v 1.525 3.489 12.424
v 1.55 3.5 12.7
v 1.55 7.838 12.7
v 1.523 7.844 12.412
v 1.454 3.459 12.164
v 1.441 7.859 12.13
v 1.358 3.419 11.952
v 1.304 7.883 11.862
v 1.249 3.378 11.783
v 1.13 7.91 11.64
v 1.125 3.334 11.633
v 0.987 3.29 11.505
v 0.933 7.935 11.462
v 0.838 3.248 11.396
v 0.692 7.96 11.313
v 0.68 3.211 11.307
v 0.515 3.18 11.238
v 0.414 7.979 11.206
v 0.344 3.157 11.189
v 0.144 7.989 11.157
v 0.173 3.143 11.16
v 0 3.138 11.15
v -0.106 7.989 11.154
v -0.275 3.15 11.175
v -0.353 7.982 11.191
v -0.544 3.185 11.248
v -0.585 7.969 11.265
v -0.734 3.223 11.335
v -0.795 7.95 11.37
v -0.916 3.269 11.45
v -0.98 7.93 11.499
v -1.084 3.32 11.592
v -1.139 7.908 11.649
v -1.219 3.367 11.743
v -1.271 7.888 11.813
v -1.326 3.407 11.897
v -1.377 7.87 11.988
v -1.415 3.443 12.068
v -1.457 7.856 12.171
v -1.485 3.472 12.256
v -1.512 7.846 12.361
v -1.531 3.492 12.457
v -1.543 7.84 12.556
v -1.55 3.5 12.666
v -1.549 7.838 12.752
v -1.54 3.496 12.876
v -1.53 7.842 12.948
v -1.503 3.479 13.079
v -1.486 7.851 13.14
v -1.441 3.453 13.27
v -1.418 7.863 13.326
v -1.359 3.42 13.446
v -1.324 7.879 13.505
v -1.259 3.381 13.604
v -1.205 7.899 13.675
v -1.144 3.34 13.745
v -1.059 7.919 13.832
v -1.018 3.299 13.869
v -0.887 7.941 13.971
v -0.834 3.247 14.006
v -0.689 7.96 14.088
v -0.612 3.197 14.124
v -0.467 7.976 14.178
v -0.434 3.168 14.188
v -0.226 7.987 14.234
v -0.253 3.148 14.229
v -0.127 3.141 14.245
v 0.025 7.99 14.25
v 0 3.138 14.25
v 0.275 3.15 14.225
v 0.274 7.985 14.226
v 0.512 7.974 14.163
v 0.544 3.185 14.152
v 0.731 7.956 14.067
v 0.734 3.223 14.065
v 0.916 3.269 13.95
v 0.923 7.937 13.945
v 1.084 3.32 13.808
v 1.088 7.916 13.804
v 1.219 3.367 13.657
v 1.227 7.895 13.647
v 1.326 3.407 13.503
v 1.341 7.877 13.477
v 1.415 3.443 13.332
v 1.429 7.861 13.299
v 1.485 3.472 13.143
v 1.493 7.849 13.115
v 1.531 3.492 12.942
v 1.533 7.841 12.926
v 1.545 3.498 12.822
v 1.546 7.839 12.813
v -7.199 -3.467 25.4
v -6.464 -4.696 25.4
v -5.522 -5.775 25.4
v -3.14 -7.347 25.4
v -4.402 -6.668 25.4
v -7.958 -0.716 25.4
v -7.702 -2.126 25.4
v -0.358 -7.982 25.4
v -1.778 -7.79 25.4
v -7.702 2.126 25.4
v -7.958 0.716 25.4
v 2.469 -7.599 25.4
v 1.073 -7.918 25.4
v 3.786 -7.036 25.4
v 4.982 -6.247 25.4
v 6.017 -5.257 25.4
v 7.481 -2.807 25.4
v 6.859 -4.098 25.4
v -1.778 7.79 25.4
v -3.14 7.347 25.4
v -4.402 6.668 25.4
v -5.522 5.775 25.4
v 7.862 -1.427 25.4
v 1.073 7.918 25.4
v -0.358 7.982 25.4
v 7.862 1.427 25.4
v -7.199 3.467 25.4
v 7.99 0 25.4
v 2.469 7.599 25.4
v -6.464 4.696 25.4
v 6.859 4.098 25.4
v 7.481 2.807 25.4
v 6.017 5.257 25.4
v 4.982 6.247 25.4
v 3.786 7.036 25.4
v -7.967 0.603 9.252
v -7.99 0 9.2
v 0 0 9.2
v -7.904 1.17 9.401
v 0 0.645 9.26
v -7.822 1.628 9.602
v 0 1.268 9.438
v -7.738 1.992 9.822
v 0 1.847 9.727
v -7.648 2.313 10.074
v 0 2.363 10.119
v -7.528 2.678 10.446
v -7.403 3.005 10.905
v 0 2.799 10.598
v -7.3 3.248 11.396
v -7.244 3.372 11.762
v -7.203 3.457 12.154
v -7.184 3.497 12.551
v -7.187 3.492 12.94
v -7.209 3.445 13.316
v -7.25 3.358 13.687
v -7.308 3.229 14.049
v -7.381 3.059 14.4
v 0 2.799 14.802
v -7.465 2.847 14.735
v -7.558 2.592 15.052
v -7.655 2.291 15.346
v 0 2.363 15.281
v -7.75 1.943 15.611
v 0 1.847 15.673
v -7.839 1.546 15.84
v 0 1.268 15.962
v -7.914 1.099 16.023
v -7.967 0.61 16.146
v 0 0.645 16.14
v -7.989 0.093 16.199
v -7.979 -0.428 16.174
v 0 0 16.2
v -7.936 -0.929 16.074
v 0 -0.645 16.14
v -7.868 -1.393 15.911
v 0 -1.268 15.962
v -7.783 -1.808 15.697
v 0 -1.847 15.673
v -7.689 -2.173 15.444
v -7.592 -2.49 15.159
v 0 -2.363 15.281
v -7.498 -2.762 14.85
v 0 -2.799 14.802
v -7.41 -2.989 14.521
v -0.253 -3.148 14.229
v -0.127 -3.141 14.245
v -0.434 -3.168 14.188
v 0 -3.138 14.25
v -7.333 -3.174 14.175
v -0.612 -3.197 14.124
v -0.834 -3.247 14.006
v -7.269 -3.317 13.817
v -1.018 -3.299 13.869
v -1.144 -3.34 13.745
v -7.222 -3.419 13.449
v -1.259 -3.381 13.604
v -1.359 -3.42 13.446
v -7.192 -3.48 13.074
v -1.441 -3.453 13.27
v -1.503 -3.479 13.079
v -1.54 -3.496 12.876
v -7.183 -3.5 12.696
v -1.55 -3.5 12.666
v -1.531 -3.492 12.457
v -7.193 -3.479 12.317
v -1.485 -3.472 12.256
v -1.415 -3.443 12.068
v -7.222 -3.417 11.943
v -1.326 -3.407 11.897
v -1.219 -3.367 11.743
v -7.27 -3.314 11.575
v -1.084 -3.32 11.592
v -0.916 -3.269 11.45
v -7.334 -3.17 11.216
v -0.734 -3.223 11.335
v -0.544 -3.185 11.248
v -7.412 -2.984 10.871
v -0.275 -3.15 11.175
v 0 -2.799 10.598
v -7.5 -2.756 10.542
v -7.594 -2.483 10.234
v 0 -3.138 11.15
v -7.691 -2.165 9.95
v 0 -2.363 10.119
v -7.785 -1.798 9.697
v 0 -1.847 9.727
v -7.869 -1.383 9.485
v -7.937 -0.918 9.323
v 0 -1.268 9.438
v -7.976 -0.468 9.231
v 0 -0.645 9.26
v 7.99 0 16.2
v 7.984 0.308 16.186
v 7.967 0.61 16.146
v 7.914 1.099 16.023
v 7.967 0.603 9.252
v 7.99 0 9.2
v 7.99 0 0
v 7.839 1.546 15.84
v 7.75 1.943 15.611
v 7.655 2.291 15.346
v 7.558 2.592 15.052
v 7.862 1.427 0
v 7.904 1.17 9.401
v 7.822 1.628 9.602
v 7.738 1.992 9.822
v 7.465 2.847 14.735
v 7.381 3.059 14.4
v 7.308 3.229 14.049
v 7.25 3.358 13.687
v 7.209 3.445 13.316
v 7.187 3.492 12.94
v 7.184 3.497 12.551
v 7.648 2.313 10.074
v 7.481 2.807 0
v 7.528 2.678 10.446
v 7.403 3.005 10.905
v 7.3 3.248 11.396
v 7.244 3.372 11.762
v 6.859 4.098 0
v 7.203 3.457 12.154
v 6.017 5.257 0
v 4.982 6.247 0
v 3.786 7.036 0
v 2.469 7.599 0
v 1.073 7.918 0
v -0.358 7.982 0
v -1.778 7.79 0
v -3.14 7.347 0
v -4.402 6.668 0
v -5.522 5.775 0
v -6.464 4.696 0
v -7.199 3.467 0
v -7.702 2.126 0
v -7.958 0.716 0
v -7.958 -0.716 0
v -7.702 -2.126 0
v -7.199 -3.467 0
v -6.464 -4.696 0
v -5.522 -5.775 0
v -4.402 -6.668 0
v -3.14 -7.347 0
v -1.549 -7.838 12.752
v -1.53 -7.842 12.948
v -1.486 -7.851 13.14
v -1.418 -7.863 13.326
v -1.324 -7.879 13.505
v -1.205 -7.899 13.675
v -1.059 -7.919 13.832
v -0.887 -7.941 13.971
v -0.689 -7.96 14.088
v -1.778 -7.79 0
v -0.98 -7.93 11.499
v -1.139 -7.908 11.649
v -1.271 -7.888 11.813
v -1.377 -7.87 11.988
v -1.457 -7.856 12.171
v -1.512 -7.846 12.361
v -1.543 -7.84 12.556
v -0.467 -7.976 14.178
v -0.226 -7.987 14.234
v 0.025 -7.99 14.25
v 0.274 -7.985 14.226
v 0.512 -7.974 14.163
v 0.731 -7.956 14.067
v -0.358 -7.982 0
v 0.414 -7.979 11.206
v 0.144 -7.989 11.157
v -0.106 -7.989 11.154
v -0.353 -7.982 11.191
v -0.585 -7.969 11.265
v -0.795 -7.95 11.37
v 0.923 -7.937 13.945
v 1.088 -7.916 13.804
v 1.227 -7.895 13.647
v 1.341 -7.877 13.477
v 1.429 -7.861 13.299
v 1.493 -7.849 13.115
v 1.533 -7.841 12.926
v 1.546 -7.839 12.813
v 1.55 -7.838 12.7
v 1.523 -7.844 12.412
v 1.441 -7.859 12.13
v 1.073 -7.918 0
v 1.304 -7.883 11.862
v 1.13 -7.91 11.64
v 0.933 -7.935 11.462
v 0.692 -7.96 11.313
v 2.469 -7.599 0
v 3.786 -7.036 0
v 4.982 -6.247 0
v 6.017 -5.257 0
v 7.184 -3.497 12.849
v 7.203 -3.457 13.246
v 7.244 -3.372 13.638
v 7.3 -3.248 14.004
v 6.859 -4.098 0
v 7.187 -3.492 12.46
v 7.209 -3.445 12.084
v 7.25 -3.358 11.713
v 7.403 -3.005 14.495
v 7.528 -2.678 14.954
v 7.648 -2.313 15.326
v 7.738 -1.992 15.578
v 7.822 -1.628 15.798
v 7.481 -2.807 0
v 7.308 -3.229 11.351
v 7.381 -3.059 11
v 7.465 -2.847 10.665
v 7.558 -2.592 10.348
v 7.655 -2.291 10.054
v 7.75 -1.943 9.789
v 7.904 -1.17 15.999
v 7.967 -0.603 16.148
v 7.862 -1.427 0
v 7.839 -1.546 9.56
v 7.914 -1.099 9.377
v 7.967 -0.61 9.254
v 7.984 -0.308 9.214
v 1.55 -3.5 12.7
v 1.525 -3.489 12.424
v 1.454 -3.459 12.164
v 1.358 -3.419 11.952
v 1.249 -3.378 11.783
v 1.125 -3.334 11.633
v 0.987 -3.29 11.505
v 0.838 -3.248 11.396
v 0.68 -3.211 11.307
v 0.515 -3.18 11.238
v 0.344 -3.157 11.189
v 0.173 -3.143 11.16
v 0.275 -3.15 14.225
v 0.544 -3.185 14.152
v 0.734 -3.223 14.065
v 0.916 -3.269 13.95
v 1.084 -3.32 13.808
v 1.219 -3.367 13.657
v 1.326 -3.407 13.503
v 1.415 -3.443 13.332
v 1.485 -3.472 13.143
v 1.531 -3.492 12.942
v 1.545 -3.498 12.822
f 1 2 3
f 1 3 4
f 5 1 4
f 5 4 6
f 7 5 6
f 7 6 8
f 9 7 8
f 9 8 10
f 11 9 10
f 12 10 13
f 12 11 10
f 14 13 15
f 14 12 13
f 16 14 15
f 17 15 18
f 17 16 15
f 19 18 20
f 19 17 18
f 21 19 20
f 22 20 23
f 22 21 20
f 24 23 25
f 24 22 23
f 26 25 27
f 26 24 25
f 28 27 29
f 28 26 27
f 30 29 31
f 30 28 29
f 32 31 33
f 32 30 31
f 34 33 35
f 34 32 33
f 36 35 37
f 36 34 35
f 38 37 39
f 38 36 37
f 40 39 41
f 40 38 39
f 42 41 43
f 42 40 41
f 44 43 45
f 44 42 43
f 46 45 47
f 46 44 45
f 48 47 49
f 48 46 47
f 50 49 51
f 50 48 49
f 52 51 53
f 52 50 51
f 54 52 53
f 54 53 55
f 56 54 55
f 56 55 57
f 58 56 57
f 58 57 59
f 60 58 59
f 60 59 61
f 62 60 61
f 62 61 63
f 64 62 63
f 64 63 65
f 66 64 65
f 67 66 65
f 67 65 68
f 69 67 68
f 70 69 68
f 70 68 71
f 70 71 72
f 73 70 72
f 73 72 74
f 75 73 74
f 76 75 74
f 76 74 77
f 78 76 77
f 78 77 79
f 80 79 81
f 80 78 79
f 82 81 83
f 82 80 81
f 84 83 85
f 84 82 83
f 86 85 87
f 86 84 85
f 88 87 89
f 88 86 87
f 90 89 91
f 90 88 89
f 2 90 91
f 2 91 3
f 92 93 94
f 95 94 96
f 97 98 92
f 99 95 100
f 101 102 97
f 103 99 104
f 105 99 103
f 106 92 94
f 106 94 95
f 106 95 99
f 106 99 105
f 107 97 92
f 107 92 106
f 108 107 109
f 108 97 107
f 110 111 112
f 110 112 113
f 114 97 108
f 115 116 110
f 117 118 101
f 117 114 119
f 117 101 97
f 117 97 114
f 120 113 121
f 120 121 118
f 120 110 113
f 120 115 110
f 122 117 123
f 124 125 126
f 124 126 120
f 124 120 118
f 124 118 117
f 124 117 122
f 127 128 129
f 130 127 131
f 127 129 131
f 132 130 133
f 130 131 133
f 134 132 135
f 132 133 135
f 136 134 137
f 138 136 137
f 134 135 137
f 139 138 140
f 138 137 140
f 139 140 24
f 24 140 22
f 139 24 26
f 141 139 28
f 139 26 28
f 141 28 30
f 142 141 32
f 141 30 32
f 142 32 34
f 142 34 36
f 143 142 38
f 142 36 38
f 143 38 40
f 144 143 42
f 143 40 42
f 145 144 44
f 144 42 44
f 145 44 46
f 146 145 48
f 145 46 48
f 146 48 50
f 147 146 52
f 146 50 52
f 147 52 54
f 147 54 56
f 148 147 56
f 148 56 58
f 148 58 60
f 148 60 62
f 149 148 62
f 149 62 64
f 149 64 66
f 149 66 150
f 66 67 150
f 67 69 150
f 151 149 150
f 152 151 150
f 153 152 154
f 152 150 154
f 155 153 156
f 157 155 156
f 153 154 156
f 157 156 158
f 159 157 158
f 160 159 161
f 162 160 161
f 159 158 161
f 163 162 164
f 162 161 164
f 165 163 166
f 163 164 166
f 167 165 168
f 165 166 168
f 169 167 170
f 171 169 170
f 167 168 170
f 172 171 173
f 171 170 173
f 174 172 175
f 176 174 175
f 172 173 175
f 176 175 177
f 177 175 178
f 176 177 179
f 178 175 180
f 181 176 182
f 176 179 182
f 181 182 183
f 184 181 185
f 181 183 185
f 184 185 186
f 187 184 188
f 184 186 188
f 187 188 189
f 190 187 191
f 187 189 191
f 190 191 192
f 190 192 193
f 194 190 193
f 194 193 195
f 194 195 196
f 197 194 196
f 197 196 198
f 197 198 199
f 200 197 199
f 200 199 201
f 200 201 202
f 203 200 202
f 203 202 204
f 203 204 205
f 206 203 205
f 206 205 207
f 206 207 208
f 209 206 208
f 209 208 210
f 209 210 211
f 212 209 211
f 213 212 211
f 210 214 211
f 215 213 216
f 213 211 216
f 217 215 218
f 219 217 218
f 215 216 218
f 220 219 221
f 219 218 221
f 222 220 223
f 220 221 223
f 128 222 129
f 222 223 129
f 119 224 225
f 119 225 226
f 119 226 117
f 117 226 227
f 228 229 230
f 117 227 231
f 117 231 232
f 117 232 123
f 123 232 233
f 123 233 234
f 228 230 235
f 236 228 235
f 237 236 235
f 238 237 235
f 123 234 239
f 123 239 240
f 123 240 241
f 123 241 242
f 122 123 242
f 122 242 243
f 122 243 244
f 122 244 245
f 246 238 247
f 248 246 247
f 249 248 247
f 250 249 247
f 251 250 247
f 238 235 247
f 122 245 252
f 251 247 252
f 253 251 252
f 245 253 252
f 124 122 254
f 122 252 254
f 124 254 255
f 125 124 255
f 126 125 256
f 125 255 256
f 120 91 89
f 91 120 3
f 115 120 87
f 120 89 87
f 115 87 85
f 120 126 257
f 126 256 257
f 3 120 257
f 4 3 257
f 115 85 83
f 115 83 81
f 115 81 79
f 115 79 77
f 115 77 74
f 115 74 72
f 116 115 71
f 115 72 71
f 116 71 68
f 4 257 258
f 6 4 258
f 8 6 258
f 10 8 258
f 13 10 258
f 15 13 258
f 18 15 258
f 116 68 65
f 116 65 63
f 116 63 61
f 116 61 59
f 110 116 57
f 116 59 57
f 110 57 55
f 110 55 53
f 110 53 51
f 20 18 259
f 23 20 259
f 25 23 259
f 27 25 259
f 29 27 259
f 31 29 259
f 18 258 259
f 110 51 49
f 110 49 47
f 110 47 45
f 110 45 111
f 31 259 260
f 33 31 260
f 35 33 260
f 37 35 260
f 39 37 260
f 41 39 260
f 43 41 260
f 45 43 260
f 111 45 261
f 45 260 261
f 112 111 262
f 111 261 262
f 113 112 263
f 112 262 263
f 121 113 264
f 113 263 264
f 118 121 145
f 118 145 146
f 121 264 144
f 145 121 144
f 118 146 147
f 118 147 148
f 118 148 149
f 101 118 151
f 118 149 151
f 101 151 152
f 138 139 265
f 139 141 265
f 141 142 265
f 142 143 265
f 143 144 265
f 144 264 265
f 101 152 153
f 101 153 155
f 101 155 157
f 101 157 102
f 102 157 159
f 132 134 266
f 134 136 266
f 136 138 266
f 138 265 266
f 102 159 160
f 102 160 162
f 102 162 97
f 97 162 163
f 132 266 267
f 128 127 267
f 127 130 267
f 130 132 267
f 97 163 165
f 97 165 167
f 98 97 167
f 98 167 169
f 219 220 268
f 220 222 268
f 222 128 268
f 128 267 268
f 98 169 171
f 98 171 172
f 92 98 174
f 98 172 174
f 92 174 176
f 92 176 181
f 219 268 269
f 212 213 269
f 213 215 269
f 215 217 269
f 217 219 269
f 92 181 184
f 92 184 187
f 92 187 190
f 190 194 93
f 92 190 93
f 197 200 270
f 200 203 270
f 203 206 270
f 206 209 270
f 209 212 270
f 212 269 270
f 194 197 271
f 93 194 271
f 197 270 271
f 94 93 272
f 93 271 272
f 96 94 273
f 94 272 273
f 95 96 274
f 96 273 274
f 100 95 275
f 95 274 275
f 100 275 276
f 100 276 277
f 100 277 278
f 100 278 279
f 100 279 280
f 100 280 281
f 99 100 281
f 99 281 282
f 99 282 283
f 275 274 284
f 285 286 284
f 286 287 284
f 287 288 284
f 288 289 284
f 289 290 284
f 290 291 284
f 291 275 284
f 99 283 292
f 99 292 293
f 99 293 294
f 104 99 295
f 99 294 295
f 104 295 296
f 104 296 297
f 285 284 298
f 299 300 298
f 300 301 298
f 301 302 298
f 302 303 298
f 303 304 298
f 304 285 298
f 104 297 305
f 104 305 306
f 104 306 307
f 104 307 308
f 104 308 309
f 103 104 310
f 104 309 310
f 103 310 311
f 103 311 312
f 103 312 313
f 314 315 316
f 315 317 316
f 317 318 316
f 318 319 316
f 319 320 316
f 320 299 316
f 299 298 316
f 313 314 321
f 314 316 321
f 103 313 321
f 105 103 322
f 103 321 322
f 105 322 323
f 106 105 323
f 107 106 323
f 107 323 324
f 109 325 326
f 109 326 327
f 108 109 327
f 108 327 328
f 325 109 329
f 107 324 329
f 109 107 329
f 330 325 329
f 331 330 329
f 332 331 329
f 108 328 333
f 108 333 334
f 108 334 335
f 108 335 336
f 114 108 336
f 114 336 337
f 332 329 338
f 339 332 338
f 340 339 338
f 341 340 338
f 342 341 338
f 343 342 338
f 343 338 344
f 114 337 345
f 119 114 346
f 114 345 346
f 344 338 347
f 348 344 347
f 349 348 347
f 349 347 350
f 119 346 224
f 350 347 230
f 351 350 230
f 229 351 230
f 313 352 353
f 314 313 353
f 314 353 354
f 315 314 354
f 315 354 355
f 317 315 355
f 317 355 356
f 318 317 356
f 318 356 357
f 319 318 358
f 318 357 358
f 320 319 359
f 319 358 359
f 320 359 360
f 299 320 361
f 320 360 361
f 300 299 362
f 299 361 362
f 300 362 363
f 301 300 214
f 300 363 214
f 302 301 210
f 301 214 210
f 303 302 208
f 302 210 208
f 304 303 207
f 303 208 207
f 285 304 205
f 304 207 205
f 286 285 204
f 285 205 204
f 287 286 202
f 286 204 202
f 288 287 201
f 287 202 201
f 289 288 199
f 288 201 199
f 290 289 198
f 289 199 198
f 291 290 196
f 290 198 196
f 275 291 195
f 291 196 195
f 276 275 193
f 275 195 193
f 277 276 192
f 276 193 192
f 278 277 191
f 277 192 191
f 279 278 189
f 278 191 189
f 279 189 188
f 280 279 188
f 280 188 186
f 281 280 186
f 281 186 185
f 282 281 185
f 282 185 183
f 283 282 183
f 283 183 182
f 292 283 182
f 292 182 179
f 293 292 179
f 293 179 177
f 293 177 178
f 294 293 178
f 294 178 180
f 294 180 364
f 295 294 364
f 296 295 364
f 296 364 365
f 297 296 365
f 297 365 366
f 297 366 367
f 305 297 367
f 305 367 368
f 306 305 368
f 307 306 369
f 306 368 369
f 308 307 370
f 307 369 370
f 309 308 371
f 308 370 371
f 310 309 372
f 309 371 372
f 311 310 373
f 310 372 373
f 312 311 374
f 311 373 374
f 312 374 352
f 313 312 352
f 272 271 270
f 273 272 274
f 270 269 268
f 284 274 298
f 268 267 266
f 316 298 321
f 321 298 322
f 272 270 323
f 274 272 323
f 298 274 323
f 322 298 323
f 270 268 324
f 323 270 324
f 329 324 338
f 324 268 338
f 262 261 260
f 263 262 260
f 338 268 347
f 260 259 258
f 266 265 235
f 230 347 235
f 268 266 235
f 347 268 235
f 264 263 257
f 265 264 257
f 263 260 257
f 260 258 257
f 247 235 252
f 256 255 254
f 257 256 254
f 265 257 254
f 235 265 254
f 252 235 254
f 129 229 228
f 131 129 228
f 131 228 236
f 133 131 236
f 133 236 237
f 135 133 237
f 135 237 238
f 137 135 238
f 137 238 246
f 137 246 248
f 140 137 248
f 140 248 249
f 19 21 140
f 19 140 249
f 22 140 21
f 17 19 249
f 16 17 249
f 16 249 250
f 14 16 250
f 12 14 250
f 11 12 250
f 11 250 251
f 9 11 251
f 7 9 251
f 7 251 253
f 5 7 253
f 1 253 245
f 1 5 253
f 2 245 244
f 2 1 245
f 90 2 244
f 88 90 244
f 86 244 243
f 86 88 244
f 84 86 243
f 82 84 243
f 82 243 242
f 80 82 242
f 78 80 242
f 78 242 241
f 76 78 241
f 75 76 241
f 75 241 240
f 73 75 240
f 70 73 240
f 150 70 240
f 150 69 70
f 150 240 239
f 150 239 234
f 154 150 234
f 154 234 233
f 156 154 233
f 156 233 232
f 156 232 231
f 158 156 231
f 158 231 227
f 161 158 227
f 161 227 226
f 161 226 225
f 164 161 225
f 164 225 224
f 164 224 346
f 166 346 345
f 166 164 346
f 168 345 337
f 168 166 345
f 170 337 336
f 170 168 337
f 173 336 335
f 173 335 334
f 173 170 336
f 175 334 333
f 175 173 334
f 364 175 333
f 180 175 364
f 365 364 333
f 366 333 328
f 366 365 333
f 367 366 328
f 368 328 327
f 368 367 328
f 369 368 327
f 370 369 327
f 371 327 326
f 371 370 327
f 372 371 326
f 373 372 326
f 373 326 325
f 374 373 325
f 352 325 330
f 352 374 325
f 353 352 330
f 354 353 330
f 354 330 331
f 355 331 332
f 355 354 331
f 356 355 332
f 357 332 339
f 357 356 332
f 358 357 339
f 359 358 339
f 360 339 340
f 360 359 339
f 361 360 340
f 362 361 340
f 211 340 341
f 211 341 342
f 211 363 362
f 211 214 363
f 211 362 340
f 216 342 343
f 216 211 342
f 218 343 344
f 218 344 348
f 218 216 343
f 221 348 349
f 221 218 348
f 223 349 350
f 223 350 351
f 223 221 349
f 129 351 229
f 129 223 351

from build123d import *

# Parameters (mm, degrees)
SKETCH1_R               = 7.99
EXTRUDE1_DEPTH          = 25.4
SKETCH2_R               = 3.5
CUT_EXTRUDE2_DEPTH      = 8.99
CUT_EXTRUDE2_DEPTH_BACK = 8.99
SKETCH3_R               = 1.55
CUT_EXTRUDE3_DEPTH      = 8.9900001
CUT_EXTRUDE3_DEPTH_BACK = 8.9900001


with BuildPart() as part:
    # Sketch1 → Extrude1 (new body)
    with BuildSketch(Plane.XY):
        Circle(SKETCH1_R)
    extrude(amount=EXTRUDE1_DEPTH)

    # Sketch2 → Cut-Extrude2 (cut, two sides)
    with BuildSketch(Plane(origin=(0, 0, 0), x_dir=(0, 0, -1), z_dir=(1, 0, 0))) as cut_extrude2_sk:
        with Locations((-12.7, 0)):
            Circle(SKETCH2_R)
    extrude(amount=CUT_EXTRUDE2_DEPTH, mode=Mode.SUBTRACT)
    extrude(cut_extrude2_sk.sketch, amount=-CUT_EXTRUDE2_DEPTH_BACK, mode=Mode.SUBTRACT)

    # Sketch3 → Cut-Extrude3 (cut, two sides)
    with BuildSketch(Plane(origin=(0, 0, 0), x_dir=(1, 0, 0), z_dir=(0, 1, 0))) as cut_extrude3_sk:
        with Locations((0, -12.7)):
            Circle(SKETCH3_R)
    extrude(amount=CUT_EXTRUDE3_DEPTH, mode=Mode.SUBTRACT)
    extrude(cut_extrude3_sk.sketch, amount=-CUT_EXTRUDE3_DEPTH_BACK, mode=Mode.SUBTRACT)


solid = part.part
